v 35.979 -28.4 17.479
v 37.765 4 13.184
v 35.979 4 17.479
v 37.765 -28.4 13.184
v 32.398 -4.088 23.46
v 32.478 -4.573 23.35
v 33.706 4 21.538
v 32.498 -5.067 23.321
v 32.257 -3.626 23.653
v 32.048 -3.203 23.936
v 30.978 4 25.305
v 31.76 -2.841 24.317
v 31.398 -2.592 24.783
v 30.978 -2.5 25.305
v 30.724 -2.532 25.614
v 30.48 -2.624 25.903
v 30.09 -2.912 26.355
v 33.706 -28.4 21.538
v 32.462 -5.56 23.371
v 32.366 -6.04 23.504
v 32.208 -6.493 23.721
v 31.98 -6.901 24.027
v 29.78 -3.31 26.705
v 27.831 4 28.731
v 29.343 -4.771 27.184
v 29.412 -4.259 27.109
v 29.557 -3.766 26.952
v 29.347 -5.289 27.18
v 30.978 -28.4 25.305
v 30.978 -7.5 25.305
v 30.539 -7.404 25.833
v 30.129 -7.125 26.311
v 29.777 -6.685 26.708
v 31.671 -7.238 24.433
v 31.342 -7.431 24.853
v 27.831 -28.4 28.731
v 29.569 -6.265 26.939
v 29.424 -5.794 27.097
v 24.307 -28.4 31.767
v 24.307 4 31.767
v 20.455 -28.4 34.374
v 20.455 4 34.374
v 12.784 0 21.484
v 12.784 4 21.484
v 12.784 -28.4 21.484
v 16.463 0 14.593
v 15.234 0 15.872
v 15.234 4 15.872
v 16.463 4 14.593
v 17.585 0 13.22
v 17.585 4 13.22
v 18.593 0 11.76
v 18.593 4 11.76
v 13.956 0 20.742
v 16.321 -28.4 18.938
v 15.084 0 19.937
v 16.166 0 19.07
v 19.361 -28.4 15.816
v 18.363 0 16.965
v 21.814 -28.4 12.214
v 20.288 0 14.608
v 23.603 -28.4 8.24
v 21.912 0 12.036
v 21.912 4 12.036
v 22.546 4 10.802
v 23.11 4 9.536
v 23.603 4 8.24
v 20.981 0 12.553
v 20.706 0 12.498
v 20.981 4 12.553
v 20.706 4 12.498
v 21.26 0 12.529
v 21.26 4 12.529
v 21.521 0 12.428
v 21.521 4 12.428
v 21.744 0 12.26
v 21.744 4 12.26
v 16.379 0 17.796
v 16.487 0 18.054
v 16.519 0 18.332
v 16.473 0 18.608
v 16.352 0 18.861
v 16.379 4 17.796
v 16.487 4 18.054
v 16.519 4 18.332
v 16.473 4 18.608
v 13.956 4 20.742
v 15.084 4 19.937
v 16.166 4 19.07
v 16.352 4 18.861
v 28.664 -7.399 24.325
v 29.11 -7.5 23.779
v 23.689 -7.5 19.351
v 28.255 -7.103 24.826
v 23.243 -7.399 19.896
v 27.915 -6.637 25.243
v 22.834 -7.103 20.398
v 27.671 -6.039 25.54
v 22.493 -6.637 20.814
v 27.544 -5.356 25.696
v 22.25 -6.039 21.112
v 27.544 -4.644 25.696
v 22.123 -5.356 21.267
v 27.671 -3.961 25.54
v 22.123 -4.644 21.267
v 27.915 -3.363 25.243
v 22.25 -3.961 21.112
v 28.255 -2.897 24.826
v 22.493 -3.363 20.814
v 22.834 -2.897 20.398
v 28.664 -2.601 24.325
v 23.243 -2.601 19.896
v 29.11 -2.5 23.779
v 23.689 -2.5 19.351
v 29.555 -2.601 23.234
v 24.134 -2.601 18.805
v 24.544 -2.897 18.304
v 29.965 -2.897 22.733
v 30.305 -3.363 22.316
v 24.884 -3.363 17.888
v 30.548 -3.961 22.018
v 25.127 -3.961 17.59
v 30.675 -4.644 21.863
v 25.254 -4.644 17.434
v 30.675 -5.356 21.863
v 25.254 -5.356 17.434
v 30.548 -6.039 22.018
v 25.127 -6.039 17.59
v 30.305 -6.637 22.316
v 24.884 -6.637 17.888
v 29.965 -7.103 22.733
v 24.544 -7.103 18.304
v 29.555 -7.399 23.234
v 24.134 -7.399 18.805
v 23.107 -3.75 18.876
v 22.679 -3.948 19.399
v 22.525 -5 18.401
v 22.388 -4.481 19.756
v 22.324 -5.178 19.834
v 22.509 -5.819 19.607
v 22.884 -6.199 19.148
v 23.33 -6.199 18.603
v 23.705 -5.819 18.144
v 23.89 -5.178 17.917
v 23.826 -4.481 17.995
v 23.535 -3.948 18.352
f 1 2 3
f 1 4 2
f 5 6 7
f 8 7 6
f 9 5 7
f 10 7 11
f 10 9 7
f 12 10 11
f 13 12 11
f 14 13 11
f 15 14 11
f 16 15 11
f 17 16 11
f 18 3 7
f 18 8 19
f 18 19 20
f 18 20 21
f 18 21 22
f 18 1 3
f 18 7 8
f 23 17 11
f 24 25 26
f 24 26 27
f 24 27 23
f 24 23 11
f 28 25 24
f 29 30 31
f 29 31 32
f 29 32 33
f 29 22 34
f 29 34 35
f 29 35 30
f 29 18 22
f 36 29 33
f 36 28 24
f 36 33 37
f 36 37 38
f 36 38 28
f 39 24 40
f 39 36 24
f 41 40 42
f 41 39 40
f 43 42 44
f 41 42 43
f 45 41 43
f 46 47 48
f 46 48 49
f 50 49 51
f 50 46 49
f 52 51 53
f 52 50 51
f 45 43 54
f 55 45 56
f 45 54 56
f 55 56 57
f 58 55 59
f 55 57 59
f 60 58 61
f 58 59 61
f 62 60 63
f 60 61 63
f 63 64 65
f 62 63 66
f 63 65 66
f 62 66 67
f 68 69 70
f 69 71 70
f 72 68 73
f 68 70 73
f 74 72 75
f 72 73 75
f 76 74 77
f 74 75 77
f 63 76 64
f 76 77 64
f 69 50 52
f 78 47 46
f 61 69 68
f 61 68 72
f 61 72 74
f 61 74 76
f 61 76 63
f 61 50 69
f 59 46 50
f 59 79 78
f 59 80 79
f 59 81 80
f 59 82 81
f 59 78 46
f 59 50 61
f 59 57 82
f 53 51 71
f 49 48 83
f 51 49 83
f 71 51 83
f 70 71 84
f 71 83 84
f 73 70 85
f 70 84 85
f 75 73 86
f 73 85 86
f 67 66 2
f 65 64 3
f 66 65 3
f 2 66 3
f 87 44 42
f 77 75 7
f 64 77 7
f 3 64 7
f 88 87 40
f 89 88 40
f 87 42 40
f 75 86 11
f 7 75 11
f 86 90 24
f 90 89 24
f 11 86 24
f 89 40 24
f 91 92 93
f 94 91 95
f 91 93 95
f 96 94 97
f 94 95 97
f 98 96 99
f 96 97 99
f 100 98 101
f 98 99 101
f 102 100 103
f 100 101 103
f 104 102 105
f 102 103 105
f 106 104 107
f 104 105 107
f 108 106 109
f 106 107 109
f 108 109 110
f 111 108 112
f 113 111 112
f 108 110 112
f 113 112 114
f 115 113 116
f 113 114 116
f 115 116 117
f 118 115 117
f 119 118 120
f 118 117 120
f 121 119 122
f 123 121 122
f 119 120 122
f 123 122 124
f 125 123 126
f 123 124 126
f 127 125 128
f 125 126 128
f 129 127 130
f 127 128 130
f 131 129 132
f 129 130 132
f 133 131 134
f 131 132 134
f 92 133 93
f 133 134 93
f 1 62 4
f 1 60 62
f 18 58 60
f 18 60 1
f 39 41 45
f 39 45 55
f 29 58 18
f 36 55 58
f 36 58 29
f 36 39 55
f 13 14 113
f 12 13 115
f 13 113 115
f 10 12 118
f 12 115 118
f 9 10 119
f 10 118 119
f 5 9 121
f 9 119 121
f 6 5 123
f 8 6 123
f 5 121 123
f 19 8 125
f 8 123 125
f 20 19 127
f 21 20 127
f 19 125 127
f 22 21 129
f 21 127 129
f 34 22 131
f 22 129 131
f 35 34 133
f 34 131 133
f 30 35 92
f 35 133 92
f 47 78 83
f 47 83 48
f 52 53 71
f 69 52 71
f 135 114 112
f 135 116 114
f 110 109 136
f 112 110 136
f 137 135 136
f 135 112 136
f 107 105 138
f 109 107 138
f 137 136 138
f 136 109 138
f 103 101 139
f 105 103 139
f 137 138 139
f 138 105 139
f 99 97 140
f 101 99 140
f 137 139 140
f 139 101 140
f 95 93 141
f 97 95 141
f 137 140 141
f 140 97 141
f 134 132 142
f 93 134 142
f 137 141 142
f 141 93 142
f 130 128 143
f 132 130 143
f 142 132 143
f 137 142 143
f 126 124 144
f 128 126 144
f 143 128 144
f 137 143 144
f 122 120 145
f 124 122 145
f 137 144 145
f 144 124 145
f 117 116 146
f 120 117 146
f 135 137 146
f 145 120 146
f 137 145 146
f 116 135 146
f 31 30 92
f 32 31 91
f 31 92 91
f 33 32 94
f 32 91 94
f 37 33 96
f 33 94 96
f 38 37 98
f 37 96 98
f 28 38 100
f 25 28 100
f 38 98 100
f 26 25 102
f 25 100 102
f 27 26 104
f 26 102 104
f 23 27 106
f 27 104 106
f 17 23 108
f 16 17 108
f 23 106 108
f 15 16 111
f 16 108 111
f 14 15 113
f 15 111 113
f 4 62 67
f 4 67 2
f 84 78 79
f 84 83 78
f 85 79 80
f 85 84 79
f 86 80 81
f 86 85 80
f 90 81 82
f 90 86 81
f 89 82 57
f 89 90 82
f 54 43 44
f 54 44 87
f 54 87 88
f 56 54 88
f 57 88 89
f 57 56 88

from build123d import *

# Parameters (mm, degrees)
F2_DEPTH = 28.4
F3_DEPTH = 4
F6_D     = 5
F6_DEPTH = 5
F6_TIP   = 1.5021515476
F7_D     = 5
F7_DEPTH = 7
F7_TIP   = 1.5021515476
F8_R     = 1


with BuildPart() as f2:
    # F0 (on Front) → F2 (new body)
    with BuildSketch(Plane.XZ):
        with BuildLine():
            Line((23.6029717884, 8.2401288069), (37.7647548615, 13.1842060911))
            ThreePointArc((37.7647548615, 13.1842060911), (30.9779974122, 25.3054080451), (20.4548362885, 34.3744043208))
            Line((20.4548362885, 34.3744043208), (12.7842726803, 21.4840027005))
            ThreePointArc((12.7842726803, 21.4840027005), (19.3612483826, 15.8158800282), (23.6029717884, 8.2401288069))
        make_face()
    extrude(amount=F2_DEPTH)

    # F1 (on Front) + F0 (on Front) → F3 (join)
    with BuildSketch(Plane.XZ):
        with BuildLine():
            ThreePointArc((15.2340019476, 15.8721512297), (17.0378985767, 13.9179744248), (18.5928148308, 11.7604097152))
            Line((18.5928148308, 11.7604097152), (21.4911474241, 12.7722583124))
            ThreePointArc((21.4911474241, 12.7722583124), (22.6606475272, 10.5591218219), (23.6029717884, 8.2401288069))
            Line((23.6029717884, 8.2401288069), (37.7647548615, 13.1842060911))
            ThreePointArc((37.7647548615, 13.1842060911), (30.9779974122, 25.3054080451), (20.4548362885, 34.3744043208))
            Line((20.4548362885, 34.3744043208), (12.7842726803, 21.4840027005))
            ThreePointArc((12.7842726803, 21.4840027005), (14.8685909795, 20.0978855177), (16.8038497839, 18.5102845046))
            Line((16.8038497839, 18.5102845046), (15.2340019476, 15.8721512297))
        make_face()
    with BuildSketch(Plane.XZ):
        with BuildLine():
            Line((23.6029717884, 8.2401288069), (37.7647548615, 13.1842060911))
            ThreePointArc((37.7647548615, 13.1842060911), (30.9779974122, 25.3054080451), (20.4548362885, 34.3744043208))
            Line((20.4548362885, 34.3744043208), (12.7842726803, 21.4840027005))
            ThreePointArc((12.7842726803, 21.4840027005), (19.3612483826, 15.8158800282), (23.6029717884, 8.2401288069))
        make_face()
    extrude(amount=-F3_DEPTH)

    # F6 (one way)
    with BuildSketch(Plane(origin=(29.109795575, 0, 23.7793052059), x_dir=(0, 1, 0), z_dir=(-0.7744499353, 0, -0.6326352011))):
        with Locations((-5, 0)):
            Circle(F6_D / 2)
    extrude(amount=-F6_DEPTH, mode=Mode.SUBTRACT)
    with Locations(Plane(origin=(29.109795575, 0, 23.7793052059), x_dir=(0, 1, 0), z_dir=(-0.7744499353, 0, -0.6326352011))):
        with Locations((-5, 0)):
            with Locations((0, 0, -(F6_DEPTH + F6_TIP / 2))):  # 118° drill point
                Cone(0, F6_D / 2, F6_TIP, mode=Mode.SUBTRACT)

    # F7
    with Locations(Plane(origin=(29.109795575, 0, 23.7793052059), x_dir=(0, 1, 0), z_dir=(0.7744499353, 0, 0.6326352011))):
        with Locations((-5, 0)):
            Hole(F7_D / 2, depth=F7_DEPTH)
            with Locations((0, 0, -(F7_DEPTH + F7_TIP / 2))):  # 118° drill point
                Cone(0, F7_D / 2, F7_TIP, mode=Mode.SUBTRACT)

    # F8
    f8_edges = [f2.edges().sort_by_distance(p)[0] for p in [
        (21.491147, 2, 12.772258),
        (16.80385, 2, 18.510285),
    ]]
    fillet(f8_edges, radius=F8_R)


solid = f2.part
